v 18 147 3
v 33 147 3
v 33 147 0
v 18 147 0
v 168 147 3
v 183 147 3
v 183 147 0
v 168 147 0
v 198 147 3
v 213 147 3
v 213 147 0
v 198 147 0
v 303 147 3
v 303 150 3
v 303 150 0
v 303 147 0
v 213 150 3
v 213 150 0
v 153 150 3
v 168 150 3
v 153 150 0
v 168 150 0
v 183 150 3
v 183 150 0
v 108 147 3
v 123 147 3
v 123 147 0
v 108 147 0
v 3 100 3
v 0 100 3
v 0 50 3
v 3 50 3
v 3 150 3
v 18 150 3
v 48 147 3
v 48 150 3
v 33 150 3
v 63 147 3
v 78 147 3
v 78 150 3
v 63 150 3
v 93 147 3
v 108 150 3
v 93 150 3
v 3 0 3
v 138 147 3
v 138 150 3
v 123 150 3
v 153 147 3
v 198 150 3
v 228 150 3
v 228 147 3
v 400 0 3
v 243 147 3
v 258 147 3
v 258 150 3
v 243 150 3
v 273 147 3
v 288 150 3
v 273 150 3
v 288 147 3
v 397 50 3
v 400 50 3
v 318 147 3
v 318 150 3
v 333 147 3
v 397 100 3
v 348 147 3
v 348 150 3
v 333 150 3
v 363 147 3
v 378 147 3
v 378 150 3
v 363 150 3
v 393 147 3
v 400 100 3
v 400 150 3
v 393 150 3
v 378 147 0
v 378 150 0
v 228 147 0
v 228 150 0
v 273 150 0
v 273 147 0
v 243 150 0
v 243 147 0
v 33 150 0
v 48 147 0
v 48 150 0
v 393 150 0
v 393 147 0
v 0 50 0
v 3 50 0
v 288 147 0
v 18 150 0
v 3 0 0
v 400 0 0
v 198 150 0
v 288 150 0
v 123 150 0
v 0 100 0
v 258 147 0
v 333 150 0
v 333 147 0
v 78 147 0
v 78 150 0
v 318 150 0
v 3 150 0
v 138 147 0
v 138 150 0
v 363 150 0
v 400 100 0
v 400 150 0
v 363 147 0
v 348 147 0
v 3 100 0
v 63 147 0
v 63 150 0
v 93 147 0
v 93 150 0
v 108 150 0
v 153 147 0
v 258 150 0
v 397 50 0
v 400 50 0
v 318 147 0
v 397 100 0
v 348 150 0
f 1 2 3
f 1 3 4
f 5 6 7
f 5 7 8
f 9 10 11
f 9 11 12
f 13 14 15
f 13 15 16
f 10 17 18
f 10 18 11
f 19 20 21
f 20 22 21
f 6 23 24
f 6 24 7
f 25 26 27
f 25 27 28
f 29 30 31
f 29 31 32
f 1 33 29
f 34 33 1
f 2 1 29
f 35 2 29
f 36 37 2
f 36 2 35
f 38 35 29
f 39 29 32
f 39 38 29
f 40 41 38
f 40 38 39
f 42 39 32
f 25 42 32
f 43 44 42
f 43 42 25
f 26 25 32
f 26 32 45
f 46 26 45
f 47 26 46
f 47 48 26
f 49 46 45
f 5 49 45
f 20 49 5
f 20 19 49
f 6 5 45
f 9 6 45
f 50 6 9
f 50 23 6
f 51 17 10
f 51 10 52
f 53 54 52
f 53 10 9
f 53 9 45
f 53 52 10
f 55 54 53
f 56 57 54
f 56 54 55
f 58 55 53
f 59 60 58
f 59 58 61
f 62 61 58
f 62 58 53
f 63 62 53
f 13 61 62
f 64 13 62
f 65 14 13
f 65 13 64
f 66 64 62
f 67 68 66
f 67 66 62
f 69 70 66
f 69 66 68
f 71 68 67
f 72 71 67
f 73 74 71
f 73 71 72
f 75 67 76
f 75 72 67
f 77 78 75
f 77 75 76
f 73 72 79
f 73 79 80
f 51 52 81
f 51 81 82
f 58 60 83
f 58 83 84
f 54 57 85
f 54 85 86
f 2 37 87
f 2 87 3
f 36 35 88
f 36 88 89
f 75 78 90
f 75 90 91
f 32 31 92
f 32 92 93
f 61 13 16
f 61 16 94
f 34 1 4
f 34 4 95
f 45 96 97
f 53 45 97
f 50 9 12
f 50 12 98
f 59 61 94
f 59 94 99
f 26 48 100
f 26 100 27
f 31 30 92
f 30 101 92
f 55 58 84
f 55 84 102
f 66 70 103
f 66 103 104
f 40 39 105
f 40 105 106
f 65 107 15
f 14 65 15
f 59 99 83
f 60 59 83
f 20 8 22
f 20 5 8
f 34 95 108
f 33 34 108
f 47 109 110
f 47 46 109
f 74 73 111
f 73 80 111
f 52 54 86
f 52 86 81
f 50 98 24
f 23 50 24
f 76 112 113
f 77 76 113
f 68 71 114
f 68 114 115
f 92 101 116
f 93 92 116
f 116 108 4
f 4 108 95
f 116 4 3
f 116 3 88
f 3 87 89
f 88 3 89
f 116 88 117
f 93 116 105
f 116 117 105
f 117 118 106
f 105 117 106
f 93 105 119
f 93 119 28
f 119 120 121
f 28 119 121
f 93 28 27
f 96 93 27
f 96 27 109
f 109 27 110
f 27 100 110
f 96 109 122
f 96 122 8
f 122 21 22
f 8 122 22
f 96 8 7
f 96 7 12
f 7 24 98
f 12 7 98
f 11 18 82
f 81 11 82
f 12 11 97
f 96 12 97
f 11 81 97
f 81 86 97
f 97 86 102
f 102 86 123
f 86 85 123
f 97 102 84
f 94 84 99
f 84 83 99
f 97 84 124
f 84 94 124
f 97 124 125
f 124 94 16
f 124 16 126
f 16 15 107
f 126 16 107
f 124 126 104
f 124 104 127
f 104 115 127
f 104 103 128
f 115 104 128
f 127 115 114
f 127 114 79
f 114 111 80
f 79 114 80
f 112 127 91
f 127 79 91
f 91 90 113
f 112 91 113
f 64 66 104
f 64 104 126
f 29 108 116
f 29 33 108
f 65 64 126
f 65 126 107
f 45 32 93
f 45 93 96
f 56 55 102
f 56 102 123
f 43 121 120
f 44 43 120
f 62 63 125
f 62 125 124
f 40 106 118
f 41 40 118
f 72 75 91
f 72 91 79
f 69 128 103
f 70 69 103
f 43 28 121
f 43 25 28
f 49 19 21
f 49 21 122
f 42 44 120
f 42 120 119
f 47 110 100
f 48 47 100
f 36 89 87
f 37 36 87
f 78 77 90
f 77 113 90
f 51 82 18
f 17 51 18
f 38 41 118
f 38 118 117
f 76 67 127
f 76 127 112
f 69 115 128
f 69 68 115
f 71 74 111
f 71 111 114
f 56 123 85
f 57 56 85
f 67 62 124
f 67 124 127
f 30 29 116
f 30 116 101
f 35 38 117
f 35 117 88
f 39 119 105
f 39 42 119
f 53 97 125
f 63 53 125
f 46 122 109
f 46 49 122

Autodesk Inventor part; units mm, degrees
ref_plane "YZ Plane" through (0, 0, 0) normal (1, 0, 0) x (0, 1, 0)
ref_plane "XZ Plane" through (0, 0, 0) normal (0, 1, 0) x (-1, 0, 0)
ref_plane "XY Plane" through (0, 0, 0) normal (0, 0, 1) x (1, 0, 0)
sketch "Boceto1" plane through (0, 0, 0) normal (0, 0, 1) x (1, 0, 0)
  line L0 (0, 0) -> (400, 0)
  line L1 (400, 0) -> (400, 150)
  line L2 (400, 150) -> (0, 150)
  line L3 (0, 150) -> (0, 0)
  dimension "d0" = 150
  dimension "d1" = 400
extrude "Extrusión1" add sketch "Boceto1" along normal blind 3
sketch "Boceto3" plane through (0, 0, 3) normal (0, 0, 1) x (1, 0, 0)
  line L0 (0, 0) -> (400, 0) construction
  line L1 (400, 0) -> (400, 150) construction
  line L2 (400, 150) -> (0, 150) construction
  line L3 (0, 150) -> (0, 0) construction
  line L4 (0, 50) -> (3, 50)
  line L5 (3, 50) -> (3, 0)
  line L6 (3, 0) -> (0, 0)
  line L7 (0, 0) -> (0, 50)
  line L8 (0, 100) -> (0, 150)
  line L9 (0, 150) -> (3, 150)
  line L10 (3, 150) -> (3, 100)
  line L11 (3, 100) -> (0, 100)
  line L12 (397, 100) -> (400, 100)
  line L13 (400, 100) -> (400, 50)
  line L14 (400, 50) -> (397, 50)
  line L15 (397, 50) -> (397, 100)
  line L16 (400, 0) -> (400, 150) construction
  point P0 (400, 75)
  point P1 (400, 75)
  dimension "d15" = 3
  dimension "d16" = 50
  dimension "d19" = 100
  dimension "d24" = 3
  dimension "d25" = 50
extrude "Extrusión3" cut sketch "Boceto3" against normal blind 3
sketch "Boceto4" plane through (0, 0, 3) normal (0, 0, 1) x (1, 0, 0)
  line L0 (3, 150) -> (3, 100) construction
  line L1 (3, 100) -> (0, 100) construction
  line L2 (0, 100) -> (0, 50) construction
  line L3 (0, 50) -> (3, 50) construction
  line L4 (3, 50) -> (3, 0) construction
  line L5 (3, 0) -> (400, 0) construction
  line L6 (400, 0) -> (400, 50) construction
  line L7 (400, 50) -> (397, 50) construction
  line L8 (397, 50) -> (397, 100) construction
  line L9 (397, 100) -> (400, 100) construction
  line L10 (400, 100) -> (400, 150) construction
  line L11 (400, 150) -> (3, 150) construction
  line L12 (18, 150) -> (33, 150)
  line L13 (33, 150) -> (33, 147)
  line L14 (33, 147) -> (18, 147)
  line L15 (18, 147) -> (18, 150)
  line L16 (3, 0) -> (400, 0) construction
  line L17 (63, 147) -> (48, 147)
  line L18 (48, 147) -> (48, 150)
  line L19 (48, 150) -> (63, 150)
  line L20 (63, 150) -> (63, 147)
  line L21 (93, 147) -> (78, 147)
  line L22 (78, 147) -> (78, 150)
  line L23 (78, 150) -> (93, 150)
  line L24 (93, 150) -> (93, 147)
  line L25 (123, 147) -> (108, 147)
  line L26 (108, 147) -> (108, 150)
  line L27 (108, 150) -> (123, 150)
  line L28 (123, 150) -> (123, 147)
  line L29 (153, 147) -> (138, 147)
  line L30 (138, 147) -> (138, 150)
  line L31 (138, 150) -> (153, 150)
  line L32 (153, 150) -> (153, 147)
  line L33 (183, 147) -> (168, 147)
  line L34 (168, 147) -> (168, 150)
  line L35 (168, 150) -> (183, 150)
  line L36 (183, 150) -> (183, 147)
  line L37 (213, 147) -> (198, 147)
  line L38 (198, 147) -> (198, 150)
  line L39 (198, 150) -> (213, 150)
  line L40 (213, 150) -> (213, 147)
  line L41 (243, 147) -> (228, 147)
  line L42 (228, 147) -> (228, 150)
  line L43 (228, 150) -> (243, 150)
  line L44 (243, 150) -> (243, 147)
  line L45 (273, 147) -> (258, 147)
  line L46 (258, 147) -> (258, 150)
  line L47 (258, 150) -> (273, 150)
  line L48 (273, 150) -> (273, 147)
  line L49 (303, 147) -> (288, 147)
  line L50 (288, 147) -> (288, 150)
  line L51 (288, 150) -> (303, 150)
  line L52 (303, 150) -> (303, 147)
  line L53 (333, 147) -> (318, 147)
  line L54 (318, 147) -> (318, 150)
  line L55 (318, 150) -> (333, 150)
  line L56 (333, 150) -> (333, 147)
  line L57 (363, 147) -> (348, 147)
  line L58 (348, 147) -> (348, 150)
  line L59 (348, 150) -> (363, 150)
  line L60 (363, 150) -> (363, 147)
  line L61 (393, 147) -> (378, 147)
  line L62 (378, 147) -> (378, 150)
  line L63 (378, 150) -> (393, 150)
  line L64 (393, 150) -> (393, 147)
  line L65 (400, 150) -> (3, 150) construction
  point P0 (0, 0)
  dimension "d28" = 3
  dimension "d29" = 15
  dimension "d30" = 15
  dimension "d33" = 30
extrude "Extrusión4" cut sketch "Boceto4" against normal blind 10
properties part number "Pared1"
